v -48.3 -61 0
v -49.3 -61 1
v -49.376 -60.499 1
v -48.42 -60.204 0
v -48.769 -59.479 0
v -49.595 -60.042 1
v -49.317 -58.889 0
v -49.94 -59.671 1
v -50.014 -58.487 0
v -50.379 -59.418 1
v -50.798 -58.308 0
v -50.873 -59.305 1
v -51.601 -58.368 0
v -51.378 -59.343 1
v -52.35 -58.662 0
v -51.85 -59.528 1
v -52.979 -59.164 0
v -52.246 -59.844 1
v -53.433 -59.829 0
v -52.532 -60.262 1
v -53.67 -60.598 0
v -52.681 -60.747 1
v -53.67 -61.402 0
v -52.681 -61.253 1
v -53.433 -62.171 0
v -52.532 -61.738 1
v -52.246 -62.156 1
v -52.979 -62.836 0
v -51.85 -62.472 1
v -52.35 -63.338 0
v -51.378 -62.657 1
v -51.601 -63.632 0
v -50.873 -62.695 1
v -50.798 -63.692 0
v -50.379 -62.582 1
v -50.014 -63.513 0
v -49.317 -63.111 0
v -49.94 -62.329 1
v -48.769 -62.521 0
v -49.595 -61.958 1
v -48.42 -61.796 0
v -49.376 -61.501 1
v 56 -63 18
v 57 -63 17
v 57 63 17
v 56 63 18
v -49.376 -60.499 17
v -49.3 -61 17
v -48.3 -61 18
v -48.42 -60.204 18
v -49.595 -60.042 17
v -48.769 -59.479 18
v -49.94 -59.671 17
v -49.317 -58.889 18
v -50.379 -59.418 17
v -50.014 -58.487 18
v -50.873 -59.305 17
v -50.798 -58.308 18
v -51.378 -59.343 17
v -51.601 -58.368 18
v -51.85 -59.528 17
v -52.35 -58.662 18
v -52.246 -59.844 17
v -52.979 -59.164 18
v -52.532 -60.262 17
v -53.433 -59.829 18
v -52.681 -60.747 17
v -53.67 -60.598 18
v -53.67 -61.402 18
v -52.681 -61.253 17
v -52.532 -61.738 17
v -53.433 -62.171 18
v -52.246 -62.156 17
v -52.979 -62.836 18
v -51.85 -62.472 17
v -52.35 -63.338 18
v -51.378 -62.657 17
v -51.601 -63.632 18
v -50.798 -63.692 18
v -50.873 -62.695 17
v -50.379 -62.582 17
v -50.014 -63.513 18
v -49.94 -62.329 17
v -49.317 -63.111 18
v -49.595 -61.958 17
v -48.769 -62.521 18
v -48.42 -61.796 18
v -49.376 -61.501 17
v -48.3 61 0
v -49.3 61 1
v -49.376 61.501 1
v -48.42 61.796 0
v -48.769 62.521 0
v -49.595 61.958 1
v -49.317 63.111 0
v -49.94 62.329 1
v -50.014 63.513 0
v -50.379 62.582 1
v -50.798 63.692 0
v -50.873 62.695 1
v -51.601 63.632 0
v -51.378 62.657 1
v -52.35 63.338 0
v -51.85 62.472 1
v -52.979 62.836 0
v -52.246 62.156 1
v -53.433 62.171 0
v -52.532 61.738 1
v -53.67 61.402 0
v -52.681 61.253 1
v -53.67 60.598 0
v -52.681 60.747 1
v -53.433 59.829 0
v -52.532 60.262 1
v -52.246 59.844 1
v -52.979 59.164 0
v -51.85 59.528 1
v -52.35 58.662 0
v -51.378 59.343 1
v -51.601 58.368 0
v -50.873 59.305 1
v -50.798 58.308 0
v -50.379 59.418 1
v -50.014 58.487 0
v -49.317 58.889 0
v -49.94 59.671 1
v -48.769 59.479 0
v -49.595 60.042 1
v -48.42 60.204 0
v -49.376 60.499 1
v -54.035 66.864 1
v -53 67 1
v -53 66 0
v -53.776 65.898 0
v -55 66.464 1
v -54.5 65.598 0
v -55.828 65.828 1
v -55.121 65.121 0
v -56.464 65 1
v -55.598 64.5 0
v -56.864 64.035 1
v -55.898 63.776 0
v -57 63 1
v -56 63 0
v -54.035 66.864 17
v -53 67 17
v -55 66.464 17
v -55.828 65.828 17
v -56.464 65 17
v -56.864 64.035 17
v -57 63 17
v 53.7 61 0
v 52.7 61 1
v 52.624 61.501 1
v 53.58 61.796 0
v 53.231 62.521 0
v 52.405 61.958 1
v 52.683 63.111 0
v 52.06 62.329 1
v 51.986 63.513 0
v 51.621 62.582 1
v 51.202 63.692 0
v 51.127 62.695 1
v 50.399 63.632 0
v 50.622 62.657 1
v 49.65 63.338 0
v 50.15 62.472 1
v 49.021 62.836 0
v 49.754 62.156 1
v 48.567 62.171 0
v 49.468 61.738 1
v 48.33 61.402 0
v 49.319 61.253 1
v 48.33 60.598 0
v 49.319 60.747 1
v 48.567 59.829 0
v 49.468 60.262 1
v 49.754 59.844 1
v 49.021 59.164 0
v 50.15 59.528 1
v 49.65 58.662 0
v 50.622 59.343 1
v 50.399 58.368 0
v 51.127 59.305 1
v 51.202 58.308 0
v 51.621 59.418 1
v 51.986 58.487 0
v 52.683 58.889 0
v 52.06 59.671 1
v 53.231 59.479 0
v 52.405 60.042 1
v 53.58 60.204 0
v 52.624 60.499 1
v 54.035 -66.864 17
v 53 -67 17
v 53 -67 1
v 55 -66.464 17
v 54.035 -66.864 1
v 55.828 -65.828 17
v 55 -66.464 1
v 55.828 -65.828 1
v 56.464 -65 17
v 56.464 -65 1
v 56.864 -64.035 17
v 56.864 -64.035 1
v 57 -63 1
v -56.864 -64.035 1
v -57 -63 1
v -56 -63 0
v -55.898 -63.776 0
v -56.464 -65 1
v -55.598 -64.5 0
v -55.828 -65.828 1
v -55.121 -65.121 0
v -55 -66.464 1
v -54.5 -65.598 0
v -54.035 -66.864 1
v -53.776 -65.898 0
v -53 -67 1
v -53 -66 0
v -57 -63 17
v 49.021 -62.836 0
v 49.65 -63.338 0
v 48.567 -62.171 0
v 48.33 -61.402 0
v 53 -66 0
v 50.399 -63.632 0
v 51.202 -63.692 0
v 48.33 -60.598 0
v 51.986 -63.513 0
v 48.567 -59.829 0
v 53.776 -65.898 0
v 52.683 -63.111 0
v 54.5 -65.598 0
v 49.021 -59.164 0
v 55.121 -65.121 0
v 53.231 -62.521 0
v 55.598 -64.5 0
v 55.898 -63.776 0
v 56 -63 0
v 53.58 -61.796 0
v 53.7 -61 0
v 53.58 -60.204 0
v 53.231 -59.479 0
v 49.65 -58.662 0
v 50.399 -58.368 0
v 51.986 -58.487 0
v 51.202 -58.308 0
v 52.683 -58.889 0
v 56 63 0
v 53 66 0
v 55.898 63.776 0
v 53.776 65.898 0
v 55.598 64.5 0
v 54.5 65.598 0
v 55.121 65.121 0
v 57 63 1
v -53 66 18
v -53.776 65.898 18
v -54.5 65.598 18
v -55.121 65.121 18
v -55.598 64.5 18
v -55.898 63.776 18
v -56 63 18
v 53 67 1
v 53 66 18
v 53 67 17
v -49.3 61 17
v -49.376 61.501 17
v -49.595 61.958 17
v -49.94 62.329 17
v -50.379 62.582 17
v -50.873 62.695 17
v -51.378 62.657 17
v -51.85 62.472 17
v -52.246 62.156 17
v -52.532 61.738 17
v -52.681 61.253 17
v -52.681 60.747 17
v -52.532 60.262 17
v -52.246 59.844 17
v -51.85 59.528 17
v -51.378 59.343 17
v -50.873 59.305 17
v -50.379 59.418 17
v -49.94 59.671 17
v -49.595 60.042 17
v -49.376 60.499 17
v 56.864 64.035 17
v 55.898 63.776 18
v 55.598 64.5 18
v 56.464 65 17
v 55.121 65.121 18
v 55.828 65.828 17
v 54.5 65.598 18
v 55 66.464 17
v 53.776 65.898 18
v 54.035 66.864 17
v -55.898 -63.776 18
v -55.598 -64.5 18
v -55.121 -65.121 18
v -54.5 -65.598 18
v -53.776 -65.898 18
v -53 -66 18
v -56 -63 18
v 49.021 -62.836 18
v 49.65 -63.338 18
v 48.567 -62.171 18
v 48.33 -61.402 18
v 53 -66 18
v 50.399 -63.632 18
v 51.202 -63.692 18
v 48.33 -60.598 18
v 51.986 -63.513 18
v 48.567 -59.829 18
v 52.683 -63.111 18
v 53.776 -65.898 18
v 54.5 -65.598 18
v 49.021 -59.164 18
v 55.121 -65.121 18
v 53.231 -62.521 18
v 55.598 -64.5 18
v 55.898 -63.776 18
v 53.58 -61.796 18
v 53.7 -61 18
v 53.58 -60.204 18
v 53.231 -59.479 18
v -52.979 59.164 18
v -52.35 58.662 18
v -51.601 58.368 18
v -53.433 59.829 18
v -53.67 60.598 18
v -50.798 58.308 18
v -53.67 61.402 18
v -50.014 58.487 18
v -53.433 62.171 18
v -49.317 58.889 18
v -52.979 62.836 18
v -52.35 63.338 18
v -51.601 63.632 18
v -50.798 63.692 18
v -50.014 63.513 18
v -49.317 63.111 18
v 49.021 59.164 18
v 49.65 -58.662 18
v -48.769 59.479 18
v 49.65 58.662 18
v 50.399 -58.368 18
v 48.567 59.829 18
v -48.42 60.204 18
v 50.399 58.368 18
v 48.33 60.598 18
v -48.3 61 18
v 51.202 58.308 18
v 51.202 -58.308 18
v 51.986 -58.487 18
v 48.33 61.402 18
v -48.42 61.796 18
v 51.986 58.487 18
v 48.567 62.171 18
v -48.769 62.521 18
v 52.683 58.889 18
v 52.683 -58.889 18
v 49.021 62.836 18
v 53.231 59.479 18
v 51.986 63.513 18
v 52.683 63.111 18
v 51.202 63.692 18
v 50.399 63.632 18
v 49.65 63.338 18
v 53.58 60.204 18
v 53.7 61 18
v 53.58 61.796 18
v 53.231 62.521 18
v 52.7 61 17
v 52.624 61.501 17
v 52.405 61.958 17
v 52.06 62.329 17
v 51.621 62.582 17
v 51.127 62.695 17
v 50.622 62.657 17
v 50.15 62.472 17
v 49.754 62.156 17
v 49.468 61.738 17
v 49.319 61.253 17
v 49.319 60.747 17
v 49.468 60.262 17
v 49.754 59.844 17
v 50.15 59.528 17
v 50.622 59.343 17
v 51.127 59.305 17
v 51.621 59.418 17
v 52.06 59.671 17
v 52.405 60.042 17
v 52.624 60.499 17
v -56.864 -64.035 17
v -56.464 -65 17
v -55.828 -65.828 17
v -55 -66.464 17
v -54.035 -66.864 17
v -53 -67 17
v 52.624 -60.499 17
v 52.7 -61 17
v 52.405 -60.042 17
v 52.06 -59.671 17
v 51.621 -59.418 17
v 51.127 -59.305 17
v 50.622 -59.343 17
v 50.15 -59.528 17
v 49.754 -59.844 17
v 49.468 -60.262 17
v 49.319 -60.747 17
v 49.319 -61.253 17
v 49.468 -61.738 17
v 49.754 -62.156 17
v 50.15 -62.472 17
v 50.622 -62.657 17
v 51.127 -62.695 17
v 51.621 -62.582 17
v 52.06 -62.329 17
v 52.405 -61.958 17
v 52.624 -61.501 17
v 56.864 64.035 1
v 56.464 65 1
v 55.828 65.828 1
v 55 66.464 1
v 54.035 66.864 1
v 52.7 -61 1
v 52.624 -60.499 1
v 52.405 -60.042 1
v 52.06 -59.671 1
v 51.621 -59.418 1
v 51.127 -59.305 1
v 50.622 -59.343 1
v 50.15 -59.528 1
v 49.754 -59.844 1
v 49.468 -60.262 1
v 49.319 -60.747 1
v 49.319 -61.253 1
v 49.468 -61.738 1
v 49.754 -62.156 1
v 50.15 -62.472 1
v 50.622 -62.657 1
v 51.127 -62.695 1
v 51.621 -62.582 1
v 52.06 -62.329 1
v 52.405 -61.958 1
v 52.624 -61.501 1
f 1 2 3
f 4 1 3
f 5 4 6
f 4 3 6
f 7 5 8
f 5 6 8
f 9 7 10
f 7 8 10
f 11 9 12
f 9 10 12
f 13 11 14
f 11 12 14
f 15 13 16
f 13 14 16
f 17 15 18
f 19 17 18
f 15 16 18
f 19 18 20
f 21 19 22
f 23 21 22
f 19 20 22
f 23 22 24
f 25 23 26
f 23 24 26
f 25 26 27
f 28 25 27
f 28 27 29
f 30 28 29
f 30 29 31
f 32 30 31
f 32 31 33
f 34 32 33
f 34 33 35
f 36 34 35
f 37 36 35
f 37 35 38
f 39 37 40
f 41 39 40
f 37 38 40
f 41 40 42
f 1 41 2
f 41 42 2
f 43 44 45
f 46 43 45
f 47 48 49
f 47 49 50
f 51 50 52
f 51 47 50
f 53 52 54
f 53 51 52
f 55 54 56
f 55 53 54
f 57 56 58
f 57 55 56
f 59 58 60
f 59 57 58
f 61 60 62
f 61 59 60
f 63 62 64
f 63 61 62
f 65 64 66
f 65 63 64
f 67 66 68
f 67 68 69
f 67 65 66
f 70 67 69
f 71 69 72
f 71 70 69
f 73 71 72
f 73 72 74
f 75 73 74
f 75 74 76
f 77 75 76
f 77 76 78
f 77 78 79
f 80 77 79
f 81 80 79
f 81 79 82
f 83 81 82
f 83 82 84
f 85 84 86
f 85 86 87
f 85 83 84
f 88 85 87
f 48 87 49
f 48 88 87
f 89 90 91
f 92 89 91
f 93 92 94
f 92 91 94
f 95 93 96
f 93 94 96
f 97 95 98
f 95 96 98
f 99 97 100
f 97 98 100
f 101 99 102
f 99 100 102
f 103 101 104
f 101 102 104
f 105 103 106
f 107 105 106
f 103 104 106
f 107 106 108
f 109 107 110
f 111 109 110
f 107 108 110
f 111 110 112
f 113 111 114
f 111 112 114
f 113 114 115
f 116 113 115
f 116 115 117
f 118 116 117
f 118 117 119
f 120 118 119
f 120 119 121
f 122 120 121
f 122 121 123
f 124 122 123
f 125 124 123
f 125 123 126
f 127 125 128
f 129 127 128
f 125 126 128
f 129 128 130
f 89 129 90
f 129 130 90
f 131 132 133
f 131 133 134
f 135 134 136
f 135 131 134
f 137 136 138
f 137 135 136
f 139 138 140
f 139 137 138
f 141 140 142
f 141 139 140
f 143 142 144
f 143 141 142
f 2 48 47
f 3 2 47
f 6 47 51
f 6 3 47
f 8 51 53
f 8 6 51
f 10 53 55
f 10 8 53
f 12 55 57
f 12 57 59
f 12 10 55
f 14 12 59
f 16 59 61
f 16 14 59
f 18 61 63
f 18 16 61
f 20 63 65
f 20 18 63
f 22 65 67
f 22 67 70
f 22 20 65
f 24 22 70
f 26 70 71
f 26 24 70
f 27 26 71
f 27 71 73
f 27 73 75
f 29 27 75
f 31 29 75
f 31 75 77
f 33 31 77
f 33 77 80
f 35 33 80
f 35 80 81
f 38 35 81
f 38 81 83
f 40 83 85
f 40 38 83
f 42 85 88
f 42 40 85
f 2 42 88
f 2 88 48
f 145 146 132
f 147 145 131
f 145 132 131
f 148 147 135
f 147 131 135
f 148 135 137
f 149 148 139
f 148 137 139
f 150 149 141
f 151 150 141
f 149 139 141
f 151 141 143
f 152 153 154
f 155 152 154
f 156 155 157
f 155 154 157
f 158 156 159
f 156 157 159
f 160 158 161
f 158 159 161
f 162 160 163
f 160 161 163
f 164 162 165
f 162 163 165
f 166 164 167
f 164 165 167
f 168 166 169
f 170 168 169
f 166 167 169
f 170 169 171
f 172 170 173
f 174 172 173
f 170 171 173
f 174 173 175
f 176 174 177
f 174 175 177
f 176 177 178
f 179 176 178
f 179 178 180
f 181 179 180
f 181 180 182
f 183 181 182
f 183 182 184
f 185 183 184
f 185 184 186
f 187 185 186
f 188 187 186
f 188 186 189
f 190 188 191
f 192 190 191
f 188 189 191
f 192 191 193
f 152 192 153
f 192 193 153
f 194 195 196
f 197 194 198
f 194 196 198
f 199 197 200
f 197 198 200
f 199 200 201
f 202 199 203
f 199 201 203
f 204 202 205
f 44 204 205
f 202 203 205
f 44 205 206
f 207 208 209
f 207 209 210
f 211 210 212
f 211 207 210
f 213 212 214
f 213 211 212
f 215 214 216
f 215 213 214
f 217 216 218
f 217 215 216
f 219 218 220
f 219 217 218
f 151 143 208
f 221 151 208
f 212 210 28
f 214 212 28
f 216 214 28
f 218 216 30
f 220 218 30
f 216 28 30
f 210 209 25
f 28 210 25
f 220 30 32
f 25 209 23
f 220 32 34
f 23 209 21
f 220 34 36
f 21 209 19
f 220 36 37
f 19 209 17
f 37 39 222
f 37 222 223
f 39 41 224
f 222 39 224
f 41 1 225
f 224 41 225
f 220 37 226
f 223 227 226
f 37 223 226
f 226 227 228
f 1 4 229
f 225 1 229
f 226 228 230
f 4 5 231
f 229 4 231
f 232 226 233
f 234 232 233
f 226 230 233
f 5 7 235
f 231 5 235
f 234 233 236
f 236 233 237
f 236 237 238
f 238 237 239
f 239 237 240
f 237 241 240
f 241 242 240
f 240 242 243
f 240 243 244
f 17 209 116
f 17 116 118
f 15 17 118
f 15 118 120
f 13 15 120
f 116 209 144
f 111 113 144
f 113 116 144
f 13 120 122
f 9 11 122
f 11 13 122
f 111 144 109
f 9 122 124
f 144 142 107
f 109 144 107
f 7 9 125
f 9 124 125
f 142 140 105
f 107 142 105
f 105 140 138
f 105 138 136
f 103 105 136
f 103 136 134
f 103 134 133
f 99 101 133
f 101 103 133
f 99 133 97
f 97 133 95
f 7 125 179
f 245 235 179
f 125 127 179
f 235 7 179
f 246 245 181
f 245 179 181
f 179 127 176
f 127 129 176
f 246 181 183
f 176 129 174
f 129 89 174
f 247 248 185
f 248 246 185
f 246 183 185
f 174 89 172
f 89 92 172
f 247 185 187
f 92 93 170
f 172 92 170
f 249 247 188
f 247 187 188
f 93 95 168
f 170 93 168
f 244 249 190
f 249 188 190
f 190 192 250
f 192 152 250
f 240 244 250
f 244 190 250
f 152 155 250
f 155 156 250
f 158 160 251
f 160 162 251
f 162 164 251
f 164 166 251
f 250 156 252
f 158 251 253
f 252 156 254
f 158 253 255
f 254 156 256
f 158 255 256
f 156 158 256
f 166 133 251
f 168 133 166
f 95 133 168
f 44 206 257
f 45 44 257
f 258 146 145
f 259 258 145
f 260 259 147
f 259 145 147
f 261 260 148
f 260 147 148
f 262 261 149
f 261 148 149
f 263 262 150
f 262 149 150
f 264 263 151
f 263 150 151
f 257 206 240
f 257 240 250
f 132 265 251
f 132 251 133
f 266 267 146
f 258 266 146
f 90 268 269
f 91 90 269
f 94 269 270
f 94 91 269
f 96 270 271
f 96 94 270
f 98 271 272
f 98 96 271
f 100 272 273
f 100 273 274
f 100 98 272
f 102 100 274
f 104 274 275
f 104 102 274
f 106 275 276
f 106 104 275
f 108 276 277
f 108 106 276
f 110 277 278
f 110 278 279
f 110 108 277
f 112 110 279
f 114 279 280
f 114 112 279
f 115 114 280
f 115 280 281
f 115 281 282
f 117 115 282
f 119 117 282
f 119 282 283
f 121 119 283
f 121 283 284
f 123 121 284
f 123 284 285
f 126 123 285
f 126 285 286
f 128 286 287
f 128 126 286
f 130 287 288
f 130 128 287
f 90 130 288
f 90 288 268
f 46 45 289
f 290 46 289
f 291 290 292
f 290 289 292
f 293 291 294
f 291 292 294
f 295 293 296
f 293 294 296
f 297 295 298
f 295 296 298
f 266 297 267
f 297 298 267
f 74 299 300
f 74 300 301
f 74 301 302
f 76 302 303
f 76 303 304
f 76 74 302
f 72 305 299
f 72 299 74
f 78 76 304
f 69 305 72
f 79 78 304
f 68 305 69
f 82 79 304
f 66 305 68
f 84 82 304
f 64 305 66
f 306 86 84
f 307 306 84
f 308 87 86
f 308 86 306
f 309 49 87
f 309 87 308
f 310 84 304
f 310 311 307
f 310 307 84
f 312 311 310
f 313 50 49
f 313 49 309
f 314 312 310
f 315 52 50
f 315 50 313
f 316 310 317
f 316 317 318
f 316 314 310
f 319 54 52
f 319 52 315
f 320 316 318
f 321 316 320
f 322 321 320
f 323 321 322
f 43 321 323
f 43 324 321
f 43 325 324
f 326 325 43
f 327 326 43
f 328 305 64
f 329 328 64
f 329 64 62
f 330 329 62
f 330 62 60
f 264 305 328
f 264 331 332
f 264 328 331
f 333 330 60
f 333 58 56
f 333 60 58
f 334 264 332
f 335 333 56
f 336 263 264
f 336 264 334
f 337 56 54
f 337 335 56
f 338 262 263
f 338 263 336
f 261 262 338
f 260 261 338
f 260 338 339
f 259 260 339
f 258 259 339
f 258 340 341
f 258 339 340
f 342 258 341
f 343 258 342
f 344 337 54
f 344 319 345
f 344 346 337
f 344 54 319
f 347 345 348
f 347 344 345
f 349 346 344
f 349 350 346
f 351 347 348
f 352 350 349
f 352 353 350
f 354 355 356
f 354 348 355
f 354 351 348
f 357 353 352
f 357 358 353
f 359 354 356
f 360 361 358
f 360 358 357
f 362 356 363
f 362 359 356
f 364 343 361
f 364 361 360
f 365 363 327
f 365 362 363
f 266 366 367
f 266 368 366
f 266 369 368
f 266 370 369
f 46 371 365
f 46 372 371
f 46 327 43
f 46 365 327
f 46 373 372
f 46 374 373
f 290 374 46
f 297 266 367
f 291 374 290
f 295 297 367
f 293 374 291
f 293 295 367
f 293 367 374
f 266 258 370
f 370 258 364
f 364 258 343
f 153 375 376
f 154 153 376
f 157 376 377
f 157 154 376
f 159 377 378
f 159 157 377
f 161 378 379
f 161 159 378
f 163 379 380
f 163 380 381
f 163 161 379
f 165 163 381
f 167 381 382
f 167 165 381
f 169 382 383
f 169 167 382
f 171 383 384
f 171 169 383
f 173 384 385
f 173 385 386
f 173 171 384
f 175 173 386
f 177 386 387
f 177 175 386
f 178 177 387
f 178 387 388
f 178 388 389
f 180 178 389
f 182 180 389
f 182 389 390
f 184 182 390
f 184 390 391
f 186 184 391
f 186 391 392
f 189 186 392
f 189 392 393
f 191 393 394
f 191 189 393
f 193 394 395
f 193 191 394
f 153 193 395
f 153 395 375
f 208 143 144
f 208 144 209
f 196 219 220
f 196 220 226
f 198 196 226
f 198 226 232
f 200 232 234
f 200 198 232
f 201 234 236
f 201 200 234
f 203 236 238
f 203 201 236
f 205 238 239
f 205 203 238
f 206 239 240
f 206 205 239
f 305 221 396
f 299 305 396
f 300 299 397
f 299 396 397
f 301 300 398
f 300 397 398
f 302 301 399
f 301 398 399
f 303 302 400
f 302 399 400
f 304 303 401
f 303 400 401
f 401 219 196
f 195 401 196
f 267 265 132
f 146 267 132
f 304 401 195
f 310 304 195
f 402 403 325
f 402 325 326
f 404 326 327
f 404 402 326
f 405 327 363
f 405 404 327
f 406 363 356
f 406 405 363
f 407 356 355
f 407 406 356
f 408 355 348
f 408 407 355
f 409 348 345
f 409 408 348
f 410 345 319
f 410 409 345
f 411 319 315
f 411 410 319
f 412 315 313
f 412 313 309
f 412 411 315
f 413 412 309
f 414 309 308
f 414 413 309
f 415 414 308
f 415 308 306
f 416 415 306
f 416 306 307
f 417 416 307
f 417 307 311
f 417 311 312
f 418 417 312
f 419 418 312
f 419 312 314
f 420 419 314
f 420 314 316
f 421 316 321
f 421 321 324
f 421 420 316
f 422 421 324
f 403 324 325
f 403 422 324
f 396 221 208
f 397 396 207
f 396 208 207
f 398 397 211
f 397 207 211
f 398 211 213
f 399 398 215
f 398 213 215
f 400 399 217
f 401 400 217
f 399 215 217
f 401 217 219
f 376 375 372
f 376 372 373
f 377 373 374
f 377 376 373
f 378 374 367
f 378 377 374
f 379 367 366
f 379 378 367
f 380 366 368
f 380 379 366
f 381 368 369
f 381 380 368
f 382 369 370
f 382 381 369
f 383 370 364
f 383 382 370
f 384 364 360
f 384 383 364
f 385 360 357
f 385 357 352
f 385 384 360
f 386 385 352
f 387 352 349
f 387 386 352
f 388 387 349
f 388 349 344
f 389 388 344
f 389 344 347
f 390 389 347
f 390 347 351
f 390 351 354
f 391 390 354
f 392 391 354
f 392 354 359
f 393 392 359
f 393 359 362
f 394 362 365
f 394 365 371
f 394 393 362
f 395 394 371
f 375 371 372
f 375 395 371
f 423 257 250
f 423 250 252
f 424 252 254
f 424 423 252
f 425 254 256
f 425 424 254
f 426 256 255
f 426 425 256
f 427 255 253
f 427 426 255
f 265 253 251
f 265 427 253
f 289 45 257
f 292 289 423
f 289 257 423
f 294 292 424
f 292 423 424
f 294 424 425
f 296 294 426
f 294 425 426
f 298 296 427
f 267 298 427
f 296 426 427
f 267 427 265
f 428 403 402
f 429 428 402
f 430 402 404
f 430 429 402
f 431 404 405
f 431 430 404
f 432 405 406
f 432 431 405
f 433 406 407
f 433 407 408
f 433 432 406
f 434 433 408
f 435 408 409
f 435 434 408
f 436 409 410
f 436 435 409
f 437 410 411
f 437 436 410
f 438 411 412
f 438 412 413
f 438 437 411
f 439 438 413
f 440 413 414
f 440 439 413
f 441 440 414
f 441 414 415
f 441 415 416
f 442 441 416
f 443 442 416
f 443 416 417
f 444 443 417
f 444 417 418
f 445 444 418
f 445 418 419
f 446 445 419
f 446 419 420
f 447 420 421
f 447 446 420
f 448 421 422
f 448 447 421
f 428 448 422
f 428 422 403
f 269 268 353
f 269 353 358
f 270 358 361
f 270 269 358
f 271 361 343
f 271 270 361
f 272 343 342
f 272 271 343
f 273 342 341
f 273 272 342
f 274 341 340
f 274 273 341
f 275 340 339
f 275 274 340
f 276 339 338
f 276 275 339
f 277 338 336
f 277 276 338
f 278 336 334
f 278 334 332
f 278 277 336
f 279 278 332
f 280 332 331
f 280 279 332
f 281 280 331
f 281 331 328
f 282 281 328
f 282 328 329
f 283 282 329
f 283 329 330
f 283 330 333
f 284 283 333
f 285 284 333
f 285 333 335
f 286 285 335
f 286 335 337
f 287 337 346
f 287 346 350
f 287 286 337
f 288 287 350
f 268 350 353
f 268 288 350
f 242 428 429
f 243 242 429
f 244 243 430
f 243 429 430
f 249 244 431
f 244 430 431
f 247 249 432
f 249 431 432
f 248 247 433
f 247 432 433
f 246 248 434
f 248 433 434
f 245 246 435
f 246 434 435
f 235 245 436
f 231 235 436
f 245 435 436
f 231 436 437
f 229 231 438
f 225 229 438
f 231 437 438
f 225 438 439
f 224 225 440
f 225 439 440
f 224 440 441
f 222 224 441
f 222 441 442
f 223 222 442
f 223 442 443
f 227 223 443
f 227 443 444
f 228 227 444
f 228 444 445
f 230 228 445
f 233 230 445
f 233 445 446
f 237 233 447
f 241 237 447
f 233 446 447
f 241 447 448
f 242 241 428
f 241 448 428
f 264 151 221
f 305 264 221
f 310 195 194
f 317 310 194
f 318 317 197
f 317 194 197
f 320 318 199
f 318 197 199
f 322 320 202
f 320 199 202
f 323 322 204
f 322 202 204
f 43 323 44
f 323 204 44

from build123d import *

# Parameters (mm, degrees)
SKETCH005_R      = 1.7
EXTRUDE003_DEPTH = 18
EXTRUDE002_DEPTH = 18
CHAMFER001_SIZE  = 1


with BuildPart() as screw_holes001:
    # Sketch005 → Extrude003 (new body)
    with BuildSketch(Plane.XY):
        with Locations((-51, 61)):
            Circle(SKETCH005_R)
        with Locations((51, 61)):
            Circle(SKETCH005_R)
        with Locations((51, -61)):
            Circle(SKETCH005_R)
        with Locations((-51, -61)):
            Circle(SKETCH005_R)
    extrude(amount=EXTRUDE003_DEPTH)


with BuildPart() as magnet_plate_with_screw_holes001:
    # Sketch004 → Extrude002 (new body)
    with BuildSketch(Plane.XY):
        with BuildLine():
            Line((-57, 63), (-57, -63))
            ThreePointArc((-57, -63), (-55.828427, -65.828427), (-53, -67))
            Line((-53, -67), (53, -67))
            ThreePointArc((53, -67), (55.828427, -65.828427), (57, -63))
            Line((57, -63), (57, 63))
            ThreePointArc((57, 63), (55.828427, 65.828427), (53, 67))
            Line((53, 67), (-53, 67))
            ThreePointArc((-53, 67), (-55.828427, 65.828427), (-57, 63))
        make_face()
    extrude(amount=EXTRUDE002_DEPTH)

    # Cut002: cut screw holes001
    add(screw_holes001.part, mode=Mode.SUBTRACT)

    # Chamfer001
    chamfer001_edges = [magnet_plate_with_screw_holes001.edges().sort_by_distance(p)[0] for p in [
        (0, -67, 0),
        (-52.7, -61, 0),
        (49.3, -61, 0),
        (-52.7, 61, 0),
        (49.3, 61, 0),
        (0, 67, 18),
        (-52.7, -61, 18),
        (49.3, -61, 18),
        (-52.7, 61, 18),
        (49.3, 61, 18),
    ]]
    chamfer(chamfer001_edges, length=CHAMFER001_SIZE)


solid = magnet_plate_with_screw_holes001.part
